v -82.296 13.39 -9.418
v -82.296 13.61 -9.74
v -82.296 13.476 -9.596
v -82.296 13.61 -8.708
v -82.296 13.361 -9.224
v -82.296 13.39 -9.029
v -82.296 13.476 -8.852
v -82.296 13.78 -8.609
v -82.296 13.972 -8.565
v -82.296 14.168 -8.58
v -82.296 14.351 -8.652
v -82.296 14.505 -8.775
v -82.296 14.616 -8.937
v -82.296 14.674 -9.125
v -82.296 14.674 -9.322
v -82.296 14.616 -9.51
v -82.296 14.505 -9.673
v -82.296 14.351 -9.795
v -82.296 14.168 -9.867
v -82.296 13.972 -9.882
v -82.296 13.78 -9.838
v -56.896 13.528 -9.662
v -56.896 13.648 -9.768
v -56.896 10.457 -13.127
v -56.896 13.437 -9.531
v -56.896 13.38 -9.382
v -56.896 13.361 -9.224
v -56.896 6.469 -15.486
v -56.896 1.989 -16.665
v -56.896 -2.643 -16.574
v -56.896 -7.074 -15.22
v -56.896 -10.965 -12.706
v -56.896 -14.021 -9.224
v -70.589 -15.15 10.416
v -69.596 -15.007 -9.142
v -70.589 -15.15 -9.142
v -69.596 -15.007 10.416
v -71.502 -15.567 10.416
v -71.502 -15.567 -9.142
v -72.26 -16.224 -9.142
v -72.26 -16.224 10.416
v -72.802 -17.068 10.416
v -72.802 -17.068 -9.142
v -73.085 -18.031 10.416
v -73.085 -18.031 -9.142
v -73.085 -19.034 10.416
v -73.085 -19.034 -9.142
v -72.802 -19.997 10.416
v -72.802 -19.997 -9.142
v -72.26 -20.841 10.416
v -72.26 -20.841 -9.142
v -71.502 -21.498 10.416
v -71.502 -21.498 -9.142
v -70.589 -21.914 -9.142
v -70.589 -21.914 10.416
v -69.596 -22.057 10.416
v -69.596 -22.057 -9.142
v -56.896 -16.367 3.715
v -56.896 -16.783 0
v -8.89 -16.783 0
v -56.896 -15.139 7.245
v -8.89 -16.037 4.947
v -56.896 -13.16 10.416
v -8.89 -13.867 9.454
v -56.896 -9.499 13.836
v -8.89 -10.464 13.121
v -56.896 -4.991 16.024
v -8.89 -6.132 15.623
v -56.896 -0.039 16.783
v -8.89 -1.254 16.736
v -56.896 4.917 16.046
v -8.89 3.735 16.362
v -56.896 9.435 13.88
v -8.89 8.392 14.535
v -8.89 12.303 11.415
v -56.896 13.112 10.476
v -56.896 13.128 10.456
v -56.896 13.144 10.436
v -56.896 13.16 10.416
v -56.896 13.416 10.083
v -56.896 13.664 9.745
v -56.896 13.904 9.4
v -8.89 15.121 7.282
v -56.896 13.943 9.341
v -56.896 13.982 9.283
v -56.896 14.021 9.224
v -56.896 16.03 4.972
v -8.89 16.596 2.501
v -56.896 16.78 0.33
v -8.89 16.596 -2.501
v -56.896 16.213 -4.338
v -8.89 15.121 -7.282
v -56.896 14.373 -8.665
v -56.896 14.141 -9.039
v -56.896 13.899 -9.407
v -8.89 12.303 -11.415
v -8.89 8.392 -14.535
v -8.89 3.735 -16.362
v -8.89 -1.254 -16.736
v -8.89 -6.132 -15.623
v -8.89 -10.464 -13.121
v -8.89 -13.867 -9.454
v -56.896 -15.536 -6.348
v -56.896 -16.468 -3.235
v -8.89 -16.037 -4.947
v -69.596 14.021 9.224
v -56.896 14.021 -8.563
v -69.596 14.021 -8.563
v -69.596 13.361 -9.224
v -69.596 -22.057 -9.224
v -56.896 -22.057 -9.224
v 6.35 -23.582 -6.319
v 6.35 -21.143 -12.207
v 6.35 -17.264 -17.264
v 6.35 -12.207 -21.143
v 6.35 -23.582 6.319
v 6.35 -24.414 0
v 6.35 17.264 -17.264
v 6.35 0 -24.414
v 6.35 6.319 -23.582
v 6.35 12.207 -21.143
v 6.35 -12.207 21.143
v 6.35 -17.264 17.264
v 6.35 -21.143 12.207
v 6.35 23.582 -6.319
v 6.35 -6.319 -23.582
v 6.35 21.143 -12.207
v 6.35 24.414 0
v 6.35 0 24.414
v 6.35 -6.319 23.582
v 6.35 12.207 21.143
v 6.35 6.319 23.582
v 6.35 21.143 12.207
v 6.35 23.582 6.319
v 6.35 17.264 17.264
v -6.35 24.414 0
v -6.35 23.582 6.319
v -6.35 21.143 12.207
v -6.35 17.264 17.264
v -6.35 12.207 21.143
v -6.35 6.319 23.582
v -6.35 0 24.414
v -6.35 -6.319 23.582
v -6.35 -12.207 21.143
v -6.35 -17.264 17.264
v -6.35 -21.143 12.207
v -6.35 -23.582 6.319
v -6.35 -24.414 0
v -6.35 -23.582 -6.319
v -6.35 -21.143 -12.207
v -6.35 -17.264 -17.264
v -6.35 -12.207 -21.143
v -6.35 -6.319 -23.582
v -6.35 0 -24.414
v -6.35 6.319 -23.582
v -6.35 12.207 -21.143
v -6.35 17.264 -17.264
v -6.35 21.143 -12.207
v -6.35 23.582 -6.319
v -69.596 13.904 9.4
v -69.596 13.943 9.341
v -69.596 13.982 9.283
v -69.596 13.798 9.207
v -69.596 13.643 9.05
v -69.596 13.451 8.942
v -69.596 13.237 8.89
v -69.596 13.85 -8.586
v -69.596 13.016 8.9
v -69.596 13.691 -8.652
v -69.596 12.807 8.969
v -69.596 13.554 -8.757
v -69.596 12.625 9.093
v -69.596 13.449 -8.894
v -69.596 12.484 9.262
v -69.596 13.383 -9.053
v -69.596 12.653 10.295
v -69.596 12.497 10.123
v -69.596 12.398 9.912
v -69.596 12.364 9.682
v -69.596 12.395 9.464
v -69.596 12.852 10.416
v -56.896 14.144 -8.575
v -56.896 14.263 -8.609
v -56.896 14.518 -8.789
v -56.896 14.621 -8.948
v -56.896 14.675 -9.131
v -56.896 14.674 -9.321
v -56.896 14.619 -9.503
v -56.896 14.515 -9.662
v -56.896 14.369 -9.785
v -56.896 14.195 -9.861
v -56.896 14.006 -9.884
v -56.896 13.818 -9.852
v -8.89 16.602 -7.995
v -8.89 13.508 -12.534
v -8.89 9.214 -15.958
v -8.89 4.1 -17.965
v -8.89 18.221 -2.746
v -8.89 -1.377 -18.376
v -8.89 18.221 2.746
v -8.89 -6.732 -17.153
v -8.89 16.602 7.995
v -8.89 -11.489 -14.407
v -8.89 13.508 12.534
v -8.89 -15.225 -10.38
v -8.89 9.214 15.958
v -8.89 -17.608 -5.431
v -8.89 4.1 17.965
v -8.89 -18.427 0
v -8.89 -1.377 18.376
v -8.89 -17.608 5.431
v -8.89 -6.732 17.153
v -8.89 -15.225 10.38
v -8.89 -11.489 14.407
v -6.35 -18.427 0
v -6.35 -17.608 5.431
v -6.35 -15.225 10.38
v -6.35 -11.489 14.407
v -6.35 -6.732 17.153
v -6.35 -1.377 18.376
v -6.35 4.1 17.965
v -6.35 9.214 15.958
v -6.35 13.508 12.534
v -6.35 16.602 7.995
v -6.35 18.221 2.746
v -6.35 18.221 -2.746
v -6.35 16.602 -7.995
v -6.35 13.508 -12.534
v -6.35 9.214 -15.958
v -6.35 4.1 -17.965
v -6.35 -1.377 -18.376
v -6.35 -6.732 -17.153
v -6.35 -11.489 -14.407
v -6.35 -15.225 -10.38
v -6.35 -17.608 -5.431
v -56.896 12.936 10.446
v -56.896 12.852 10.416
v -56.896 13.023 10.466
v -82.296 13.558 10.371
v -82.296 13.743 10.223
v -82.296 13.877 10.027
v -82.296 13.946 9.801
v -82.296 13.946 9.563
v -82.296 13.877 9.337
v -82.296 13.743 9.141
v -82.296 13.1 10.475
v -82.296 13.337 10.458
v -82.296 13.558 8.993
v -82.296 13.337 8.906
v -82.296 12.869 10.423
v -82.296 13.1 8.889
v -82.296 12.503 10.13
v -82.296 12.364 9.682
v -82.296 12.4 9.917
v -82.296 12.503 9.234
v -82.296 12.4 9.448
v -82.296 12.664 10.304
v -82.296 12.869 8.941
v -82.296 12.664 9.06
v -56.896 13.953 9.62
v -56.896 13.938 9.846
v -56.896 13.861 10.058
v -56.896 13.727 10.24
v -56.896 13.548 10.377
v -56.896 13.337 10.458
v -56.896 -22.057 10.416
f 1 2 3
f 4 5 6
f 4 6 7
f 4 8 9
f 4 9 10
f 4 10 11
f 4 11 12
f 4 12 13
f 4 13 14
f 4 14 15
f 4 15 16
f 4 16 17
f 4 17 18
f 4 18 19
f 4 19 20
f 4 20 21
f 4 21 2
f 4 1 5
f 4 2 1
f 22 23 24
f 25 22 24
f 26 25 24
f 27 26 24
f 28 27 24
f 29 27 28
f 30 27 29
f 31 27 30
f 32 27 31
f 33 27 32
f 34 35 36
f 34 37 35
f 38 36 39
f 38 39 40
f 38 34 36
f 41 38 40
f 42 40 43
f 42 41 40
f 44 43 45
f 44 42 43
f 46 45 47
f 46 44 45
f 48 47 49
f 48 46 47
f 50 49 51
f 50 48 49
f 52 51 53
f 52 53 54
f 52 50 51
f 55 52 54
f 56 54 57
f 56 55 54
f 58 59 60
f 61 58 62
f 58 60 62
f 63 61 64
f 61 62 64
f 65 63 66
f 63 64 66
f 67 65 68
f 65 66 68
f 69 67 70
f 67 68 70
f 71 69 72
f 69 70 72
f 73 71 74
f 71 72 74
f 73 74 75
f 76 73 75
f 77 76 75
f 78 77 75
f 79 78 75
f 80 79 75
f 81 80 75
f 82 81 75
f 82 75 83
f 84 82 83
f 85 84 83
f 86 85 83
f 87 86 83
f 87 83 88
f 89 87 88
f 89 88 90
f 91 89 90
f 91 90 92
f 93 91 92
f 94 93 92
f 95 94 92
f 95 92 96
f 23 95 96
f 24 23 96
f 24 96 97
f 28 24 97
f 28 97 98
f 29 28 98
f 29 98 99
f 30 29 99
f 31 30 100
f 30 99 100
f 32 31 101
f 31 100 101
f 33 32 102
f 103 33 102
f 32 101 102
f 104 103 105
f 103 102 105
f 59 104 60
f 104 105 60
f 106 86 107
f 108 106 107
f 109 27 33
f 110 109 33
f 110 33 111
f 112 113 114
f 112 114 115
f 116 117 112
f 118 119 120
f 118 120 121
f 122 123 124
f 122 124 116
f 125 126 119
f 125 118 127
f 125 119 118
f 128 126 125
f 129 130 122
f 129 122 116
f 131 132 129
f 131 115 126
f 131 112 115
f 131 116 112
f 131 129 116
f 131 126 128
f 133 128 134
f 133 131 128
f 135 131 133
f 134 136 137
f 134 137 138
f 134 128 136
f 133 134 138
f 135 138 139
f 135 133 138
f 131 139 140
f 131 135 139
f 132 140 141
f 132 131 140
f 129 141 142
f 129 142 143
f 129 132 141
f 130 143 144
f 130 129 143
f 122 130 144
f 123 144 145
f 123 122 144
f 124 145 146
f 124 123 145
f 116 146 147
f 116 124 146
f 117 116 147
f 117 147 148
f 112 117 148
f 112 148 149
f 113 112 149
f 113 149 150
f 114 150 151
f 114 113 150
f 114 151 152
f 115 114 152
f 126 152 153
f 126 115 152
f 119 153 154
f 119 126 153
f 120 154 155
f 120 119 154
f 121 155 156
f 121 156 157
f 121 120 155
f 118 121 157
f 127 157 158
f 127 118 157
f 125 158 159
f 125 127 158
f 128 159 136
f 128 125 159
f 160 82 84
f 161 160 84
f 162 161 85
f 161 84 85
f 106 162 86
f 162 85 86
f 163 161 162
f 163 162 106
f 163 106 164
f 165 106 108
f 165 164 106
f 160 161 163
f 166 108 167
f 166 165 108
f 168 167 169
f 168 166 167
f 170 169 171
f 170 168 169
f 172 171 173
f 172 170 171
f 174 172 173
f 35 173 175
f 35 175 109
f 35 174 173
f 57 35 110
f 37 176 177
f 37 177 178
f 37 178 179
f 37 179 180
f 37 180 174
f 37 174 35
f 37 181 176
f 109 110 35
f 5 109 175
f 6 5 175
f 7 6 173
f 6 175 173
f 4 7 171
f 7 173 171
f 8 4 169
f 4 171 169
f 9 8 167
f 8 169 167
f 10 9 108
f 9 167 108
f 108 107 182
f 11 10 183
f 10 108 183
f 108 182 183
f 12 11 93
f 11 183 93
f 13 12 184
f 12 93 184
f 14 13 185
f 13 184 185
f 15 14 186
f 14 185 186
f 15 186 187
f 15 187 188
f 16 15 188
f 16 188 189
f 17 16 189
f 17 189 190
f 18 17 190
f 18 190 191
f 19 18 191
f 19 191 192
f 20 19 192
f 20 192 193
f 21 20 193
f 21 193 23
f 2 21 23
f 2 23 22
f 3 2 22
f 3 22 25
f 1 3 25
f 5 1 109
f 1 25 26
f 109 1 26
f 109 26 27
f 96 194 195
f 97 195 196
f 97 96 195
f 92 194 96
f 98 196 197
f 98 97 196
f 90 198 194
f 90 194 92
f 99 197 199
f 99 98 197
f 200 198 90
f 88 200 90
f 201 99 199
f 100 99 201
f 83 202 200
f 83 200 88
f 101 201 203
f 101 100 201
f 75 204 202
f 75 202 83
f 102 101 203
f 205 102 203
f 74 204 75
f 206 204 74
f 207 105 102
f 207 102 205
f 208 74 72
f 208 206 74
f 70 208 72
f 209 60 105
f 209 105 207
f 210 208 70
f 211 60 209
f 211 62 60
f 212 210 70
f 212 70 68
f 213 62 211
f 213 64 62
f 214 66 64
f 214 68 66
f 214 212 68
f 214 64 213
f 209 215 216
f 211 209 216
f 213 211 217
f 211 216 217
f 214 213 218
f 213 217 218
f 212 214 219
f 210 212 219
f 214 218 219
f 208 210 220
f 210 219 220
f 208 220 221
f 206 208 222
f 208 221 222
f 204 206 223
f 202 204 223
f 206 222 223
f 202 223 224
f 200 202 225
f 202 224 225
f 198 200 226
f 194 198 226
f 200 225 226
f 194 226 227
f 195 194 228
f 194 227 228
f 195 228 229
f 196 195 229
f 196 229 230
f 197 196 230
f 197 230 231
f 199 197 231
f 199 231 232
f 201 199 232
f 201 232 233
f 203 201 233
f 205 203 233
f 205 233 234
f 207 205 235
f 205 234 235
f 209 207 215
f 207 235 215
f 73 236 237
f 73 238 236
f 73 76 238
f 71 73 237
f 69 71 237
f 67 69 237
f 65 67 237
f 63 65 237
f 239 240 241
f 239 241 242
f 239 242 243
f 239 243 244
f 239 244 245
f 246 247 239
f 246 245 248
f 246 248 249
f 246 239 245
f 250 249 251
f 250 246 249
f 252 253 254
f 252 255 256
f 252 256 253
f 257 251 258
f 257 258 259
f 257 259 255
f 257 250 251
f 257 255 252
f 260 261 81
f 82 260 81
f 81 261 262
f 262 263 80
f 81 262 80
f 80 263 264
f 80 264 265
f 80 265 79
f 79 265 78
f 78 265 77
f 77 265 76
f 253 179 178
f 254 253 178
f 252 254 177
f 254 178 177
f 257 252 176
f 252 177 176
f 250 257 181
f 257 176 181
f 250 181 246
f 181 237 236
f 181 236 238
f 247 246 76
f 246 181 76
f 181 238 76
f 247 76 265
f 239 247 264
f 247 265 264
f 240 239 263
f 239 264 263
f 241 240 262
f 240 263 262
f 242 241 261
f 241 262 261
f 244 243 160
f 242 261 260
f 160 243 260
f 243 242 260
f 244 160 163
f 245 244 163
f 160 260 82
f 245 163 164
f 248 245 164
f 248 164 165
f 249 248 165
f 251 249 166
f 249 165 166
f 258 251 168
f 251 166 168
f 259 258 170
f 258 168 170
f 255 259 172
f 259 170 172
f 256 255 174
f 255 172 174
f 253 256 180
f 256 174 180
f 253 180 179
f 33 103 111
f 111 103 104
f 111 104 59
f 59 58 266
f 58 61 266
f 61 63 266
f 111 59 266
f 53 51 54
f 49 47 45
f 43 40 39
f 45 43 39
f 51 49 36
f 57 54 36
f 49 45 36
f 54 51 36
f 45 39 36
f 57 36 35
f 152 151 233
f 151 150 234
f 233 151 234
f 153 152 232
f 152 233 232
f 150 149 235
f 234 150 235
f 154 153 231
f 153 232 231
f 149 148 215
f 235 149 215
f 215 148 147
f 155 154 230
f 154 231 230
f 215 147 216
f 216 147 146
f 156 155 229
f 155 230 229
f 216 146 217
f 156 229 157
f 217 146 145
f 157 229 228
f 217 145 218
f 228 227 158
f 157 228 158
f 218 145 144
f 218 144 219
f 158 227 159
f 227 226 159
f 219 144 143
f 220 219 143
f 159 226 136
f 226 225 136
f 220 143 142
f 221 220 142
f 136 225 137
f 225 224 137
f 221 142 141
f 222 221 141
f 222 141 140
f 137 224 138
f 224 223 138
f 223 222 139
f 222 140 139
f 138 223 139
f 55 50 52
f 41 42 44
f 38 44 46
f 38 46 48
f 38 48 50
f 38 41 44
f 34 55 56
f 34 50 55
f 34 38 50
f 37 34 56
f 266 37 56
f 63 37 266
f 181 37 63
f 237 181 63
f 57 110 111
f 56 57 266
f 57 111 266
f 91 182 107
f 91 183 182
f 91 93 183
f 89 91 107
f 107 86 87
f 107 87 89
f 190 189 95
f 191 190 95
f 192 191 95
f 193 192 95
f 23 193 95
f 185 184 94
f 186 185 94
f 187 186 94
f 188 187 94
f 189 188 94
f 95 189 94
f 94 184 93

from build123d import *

# Parameters (mm, degrees)
F0_R      = 24.4143154864
F1_DEPTH  = 6.35
F2_R      = 18.4271469793
F3_DEPTH  = 2.54
F4_R      = 16.7830167103
F4_R_2    = 11.3536850354
F5_DEPTH  = 48.006
F7_DEPTH  = 12.7
F9_R      = 0.7955502835
F10_DEPTH = 25.4
F11_R     = 0.6602201081
F12_DEPTH = 25.4
F14_DEPTH = 2.54
F16_DEPTH = 17.018


with BuildPart() as f1:
    # F0 (on Right) → F1 (new body, symmetric)
    with BuildSketch(Plane.YZ):
        Circle(F0_R)
    extrude(amount=F1_DEPTH, both=True)

    # F2 (on face) → F3 (join)
    with BuildSketch(Plane(origin=(-6.35, 0, 0), x_dir=(0, -1, 0), z_dir=(-1, 0, 0))):
        Circle(F2_R)
    extrude(amount=F3_DEPTH)

    # F4 (on face) → F5 (join)
    with BuildSketch(Plane(origin=(-8.89, 0, 0), x_dir=(0, -1, 0), z_dir=(-1, 0, 0))):
        Circle(F4_R)
        Circle(F4_R_2, mode=Mode.SUBTRACT)
        Circle(F4_R_2)
    extrude(amount=F5_DEPTH)

    # F6 (on face) → F7 (join)
    with BuildSketch(Plane(origin=(-56.896, 0, 0), x_dir=(0, -1, 0), z_dir=(-1, 0, 0))):
        with BuildLine():
            Line((-14.0211542356, 9.2237131244), (-14.0211542356, -9.2237131244))
            Line((-14.0211542356, -9.2237131244), (14.0211542356, -9.2237131244))
            ThreePointArc((14.0211542356, -9.2237131244), (16.0777317389, -4.814165767), (16.7830167103, 0))
            ThreePointArc((16.7830167103, 0), (15.8513574313, 5.5139928803), (13.1598161847, 10.4157999158))
            Line((13.1598161847, 10.4157999158), (-13.1598161847, 10.4157999158))
            ThreePointArc((-13.1598161847, 10.4157999158), (-13.6035493889, 9.8291959958), (-14.0211542356, 9.2237131244))
        make_face()
        with BuildLine():
            ThreePointArc((16.7830167103, 0), (16.0777317389, -4.814165767), (14.0211542356, -9.2237131244))
            Line((14.0211542356, -9.2237131244), (22.0571234822, -9.2237131244))
            Line((22.0571234822, -9.2237131244), (22.0571234822, 10.4157999158))
            Line((22.0571234822, 10.4157999158), (13.1598161847, 10.4157999158))
            ThreePointArc((13.1598161847, 10.4157999158), (15.8513574313, 5.5139928803), (16.7830167103, 0))
        make_face()
    extrude(amount=F7_DEPTH)

    # F9 (on face) → F10 (join)
    with BuildSketch(Plane(origin=(-56.896, 0, 0), x_dir=(0, -1, 0), z_dir=(-1, 0, 0))):
        with Locations((-13.1598161847, 9.6820201725)):
            Circle(F9_R)
    extrude(amount=F10_DEPTH)

    # F11 (on face) → F12 (join)
    with BuildSketch(Plane(origin=(-56.896, 0, 0), x_dir=(0, -1, 0), z_dir=(-1, 0, 0))):
        with Locations((-14.0211542356, -9.2237131244)):
            Circle(F11_R)
    extrude(amount=F12_DEPTH)

    # F13 (on face) → F14 (join)
    with BuildSketch(Plane.XY.offset(10.4157999158)):
        with BuildLine():
            Line((-69.596, -22.0571234822), (-69.596, -15.0072947145))
            ThreePointArc((-69.596, -15.0072947145), (-73.1209143839, -18.5322090983), (-69.596, -22.0571234822))
        make_face()
    extrude(amount=-F14_DEPTH)

    # F16 (add): a face of the model
    f16_faces = [f1.faces().sort_by_distance(p)[0] for p in [
        (-71.0920201285, -18.5322090983, 7.8757999158),
    ]]
    extrude(f16_faces, amount=F16_DEPTH)


solid = f1.part
